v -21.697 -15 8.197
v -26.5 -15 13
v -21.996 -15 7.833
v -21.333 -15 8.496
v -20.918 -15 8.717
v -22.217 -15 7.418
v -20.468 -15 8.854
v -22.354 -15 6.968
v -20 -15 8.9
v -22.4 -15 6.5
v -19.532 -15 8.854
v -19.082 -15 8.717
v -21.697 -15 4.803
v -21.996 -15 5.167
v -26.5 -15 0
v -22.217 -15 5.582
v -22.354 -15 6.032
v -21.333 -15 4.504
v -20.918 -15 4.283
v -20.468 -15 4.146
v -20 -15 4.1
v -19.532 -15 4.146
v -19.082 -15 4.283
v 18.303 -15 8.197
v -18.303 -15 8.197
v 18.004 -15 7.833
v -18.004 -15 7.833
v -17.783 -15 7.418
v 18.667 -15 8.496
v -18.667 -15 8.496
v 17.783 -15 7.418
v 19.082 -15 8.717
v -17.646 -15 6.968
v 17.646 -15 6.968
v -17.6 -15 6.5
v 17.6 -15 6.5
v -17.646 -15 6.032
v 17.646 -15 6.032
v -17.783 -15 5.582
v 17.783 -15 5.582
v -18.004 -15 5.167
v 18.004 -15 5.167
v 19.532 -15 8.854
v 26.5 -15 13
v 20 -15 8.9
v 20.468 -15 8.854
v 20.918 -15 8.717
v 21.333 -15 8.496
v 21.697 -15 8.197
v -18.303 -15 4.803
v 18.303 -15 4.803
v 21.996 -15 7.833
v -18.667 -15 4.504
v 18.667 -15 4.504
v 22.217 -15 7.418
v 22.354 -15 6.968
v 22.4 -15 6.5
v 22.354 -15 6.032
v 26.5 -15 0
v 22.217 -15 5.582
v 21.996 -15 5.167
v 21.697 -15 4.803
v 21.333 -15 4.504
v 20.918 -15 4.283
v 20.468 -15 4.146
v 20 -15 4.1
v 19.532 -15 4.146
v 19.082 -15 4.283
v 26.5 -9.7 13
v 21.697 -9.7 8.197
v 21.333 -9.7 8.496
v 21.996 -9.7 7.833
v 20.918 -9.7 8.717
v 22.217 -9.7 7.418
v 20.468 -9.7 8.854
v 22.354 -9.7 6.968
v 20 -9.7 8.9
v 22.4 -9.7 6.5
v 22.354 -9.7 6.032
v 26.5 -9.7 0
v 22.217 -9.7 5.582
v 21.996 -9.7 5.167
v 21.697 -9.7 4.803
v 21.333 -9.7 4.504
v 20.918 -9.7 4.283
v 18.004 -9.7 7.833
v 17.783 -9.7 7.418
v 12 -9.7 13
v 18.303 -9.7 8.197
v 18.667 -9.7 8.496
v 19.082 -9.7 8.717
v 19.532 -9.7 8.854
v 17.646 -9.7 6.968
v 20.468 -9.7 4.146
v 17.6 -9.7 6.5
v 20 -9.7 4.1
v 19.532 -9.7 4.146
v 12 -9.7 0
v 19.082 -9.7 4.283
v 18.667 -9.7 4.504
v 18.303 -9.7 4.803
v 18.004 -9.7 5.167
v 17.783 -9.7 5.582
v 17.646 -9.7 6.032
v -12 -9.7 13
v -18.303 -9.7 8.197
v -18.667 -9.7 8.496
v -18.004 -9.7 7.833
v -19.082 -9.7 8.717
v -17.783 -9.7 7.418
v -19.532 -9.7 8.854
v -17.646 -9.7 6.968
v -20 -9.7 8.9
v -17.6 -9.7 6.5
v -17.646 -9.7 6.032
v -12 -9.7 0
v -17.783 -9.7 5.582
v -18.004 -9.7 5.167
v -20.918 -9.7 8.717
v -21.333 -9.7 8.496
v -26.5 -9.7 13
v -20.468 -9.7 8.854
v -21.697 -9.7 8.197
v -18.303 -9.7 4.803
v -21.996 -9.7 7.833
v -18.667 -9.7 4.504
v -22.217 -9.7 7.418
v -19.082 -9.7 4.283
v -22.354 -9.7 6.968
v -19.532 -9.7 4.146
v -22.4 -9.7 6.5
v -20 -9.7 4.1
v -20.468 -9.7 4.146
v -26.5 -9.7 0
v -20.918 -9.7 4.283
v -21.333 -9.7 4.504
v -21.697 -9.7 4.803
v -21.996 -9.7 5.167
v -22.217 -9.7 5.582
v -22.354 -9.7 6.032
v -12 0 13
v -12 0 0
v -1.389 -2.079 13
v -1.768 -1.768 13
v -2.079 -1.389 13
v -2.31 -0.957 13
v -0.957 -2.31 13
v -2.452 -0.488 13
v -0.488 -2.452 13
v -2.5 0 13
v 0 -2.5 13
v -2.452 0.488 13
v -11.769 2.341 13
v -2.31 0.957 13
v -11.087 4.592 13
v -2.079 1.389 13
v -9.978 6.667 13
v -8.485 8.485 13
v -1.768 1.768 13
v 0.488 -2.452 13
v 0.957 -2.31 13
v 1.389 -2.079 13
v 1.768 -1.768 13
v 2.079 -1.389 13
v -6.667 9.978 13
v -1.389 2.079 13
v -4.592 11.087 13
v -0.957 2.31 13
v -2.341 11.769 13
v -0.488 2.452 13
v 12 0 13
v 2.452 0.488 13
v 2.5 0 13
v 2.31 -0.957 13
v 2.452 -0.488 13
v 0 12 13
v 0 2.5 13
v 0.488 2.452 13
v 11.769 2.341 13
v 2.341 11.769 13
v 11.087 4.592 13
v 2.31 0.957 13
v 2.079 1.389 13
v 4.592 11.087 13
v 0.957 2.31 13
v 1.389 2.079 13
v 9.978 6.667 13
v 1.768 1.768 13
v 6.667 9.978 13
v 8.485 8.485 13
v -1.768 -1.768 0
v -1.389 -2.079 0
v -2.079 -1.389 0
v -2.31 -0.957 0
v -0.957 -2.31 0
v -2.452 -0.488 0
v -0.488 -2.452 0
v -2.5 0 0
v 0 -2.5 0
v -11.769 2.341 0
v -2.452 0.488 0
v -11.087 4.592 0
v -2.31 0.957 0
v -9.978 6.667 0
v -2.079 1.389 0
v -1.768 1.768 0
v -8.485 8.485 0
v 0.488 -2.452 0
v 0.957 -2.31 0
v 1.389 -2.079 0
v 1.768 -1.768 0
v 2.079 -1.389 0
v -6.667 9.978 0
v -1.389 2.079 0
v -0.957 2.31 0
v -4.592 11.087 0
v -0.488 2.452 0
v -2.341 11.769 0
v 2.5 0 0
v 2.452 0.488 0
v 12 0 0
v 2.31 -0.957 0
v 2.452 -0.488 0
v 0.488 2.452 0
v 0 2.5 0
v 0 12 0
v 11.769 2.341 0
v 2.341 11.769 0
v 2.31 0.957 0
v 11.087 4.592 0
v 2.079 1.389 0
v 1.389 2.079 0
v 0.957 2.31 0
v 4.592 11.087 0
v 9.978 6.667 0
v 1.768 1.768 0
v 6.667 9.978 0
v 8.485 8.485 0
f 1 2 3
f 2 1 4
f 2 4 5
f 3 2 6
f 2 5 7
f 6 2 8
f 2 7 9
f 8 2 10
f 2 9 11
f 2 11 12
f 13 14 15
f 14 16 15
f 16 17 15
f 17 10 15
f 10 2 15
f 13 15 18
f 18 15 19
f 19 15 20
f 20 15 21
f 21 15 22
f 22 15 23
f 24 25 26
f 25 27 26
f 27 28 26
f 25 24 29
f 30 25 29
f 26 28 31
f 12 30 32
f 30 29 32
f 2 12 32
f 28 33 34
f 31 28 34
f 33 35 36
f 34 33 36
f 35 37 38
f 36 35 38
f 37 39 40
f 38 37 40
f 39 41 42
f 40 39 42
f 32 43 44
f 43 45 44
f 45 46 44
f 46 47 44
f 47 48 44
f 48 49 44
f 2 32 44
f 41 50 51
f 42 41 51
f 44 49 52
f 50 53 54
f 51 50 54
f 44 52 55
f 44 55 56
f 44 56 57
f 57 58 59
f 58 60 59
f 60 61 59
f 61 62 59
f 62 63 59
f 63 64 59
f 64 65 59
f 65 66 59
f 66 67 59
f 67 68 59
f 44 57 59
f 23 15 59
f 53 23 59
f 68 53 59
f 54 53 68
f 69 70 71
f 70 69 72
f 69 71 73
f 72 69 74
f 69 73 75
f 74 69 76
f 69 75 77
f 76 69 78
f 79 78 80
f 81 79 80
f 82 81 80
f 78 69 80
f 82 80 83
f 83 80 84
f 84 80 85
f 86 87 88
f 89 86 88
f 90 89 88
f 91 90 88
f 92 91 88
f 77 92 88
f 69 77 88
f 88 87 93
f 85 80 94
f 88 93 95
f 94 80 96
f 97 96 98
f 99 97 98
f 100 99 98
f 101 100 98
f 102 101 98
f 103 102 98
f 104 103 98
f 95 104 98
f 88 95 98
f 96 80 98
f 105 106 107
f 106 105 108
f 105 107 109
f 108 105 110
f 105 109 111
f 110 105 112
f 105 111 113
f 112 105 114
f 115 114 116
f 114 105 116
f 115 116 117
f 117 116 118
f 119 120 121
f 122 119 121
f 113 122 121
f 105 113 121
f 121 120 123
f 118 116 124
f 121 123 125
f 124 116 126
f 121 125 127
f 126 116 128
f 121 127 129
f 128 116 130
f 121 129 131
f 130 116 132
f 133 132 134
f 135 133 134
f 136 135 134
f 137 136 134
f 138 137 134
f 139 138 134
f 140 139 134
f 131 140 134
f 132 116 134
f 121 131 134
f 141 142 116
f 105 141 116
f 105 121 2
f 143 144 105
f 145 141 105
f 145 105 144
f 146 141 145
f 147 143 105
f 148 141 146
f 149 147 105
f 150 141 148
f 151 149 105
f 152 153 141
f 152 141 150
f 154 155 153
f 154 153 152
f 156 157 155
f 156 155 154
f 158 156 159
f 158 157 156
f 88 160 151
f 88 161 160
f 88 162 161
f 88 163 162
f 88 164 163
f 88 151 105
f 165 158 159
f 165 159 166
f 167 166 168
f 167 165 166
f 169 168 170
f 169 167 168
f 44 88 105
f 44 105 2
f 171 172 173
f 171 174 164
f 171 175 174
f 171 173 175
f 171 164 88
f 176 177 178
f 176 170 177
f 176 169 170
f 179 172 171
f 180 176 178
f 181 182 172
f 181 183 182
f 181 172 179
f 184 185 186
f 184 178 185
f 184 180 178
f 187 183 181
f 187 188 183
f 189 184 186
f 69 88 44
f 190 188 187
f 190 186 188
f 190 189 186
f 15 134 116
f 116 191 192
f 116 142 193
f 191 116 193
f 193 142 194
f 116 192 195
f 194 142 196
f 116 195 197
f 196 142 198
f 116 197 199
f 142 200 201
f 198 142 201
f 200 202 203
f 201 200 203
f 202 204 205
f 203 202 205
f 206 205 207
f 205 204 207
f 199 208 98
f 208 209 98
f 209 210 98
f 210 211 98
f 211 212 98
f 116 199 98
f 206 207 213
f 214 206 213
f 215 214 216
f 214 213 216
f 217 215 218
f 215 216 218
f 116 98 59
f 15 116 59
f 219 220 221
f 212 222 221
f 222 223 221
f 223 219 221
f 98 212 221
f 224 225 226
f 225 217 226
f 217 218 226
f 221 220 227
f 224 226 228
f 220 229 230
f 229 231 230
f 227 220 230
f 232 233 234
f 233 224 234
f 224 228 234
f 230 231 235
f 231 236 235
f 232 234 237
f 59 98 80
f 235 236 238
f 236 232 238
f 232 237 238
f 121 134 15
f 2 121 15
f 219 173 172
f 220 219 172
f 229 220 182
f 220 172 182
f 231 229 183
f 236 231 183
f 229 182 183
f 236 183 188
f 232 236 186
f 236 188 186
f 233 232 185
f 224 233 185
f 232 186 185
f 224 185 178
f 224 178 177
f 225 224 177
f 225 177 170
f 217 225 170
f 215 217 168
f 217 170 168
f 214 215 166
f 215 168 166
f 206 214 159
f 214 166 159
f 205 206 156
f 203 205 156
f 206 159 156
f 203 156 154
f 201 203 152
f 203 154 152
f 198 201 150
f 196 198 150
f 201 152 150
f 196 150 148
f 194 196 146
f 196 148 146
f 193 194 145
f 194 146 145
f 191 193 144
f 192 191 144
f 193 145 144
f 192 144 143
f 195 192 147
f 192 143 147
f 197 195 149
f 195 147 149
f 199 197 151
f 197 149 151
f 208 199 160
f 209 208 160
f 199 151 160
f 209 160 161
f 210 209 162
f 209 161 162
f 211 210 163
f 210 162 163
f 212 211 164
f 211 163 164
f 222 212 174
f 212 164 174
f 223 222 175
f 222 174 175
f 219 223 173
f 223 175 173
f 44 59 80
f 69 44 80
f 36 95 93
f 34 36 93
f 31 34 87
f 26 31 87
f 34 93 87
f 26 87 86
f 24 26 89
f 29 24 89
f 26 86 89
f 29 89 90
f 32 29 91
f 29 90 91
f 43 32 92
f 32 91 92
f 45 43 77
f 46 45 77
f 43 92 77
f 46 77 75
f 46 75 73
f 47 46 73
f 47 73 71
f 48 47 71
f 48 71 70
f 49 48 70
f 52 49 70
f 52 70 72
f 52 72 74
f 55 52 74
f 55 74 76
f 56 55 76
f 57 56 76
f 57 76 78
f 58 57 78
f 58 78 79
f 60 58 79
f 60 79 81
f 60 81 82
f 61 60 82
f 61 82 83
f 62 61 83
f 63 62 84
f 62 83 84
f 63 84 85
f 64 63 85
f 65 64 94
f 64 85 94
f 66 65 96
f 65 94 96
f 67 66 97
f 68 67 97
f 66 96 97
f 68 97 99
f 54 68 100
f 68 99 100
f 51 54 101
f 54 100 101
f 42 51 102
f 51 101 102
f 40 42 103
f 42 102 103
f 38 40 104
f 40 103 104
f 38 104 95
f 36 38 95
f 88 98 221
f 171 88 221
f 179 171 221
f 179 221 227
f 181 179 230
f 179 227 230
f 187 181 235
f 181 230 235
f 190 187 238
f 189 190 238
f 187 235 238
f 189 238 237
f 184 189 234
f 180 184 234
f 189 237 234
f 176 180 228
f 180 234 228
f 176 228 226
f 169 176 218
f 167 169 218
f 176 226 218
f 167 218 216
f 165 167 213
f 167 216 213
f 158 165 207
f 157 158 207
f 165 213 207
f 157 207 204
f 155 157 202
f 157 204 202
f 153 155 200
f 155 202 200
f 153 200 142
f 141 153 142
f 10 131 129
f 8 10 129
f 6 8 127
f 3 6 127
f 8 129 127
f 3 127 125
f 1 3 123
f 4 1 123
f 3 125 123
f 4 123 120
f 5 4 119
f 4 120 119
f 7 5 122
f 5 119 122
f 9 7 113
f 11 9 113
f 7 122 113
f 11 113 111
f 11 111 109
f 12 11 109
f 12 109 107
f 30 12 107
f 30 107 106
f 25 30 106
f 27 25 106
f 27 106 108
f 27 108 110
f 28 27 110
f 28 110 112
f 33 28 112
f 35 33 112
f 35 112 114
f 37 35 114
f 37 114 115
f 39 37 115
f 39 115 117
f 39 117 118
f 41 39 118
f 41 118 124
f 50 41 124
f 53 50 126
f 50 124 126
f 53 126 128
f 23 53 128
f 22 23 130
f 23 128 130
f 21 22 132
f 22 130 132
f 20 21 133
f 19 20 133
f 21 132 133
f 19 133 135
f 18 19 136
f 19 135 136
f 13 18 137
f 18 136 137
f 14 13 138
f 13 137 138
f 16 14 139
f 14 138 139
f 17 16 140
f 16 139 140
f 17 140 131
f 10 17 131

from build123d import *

# Parameters (mm, degrees)
EXTRUDE_1_DEPTH     = 13
SKETCH_2_R          = 2.5
CUT_EXTRUDE_1_DEPTH = 13
SKETCH_3_R          = 2.4
CUT_EXTRUDE_2_DEPTH = 13


with BuildPart() as part:
    # 草图1 → 凸台-拉伸1 (new body)
    with BuildSketch(Plane.XY):
        with BuildLine():
            Line((-12, -9.7), (-26.5, -9.7))
            Line((-26.5, -9.7), (-26.5, -15))
            Line((-26.5, -15), (26.5, -15))
            Line((26.5, -15), (26.5, -9.7))
            Line((26.5, -9.7), (12, -9.7))
            Line((12, -9.7), (12, 0))
            ThreePointArc((12, 0), (0, 12), (-12, 0))
            Line((-12, 0), (-12, -9.7))
        make_face()
    extrude(amount=EXTRUDE_1_DEPTH)

    # 草图2 → 切除-拉伸1 (cut)
    with BuildSketch(Plane.XY.offset(13)):
        Circle(SKETCH_2_R)
    extrude(amount=-CUT_EXTRUDE_1_DEPTH, mode=Mode.SUBTRACT)

    # 草图3 → 切除-拉伸2 (cut)
    with BuildSketch(Plane(origin=(0, -9.7, 0), x_dir=(1, 0, 0), z_dir=(0, 1, 0))):
        with Locations(Location((20, -6.5, 0), (0, 0, 180))):
            Circle(SKETCH_3_R)
        with Locations(Location((-20, -6.5, 0), (0, 0, 180))):
            Circle(SKETCH_3_R)
    extrude(amount=-CUT_EXTRUDE_2_DEPTH, mode=Mode.SUBTRACT)


solid = part.part
